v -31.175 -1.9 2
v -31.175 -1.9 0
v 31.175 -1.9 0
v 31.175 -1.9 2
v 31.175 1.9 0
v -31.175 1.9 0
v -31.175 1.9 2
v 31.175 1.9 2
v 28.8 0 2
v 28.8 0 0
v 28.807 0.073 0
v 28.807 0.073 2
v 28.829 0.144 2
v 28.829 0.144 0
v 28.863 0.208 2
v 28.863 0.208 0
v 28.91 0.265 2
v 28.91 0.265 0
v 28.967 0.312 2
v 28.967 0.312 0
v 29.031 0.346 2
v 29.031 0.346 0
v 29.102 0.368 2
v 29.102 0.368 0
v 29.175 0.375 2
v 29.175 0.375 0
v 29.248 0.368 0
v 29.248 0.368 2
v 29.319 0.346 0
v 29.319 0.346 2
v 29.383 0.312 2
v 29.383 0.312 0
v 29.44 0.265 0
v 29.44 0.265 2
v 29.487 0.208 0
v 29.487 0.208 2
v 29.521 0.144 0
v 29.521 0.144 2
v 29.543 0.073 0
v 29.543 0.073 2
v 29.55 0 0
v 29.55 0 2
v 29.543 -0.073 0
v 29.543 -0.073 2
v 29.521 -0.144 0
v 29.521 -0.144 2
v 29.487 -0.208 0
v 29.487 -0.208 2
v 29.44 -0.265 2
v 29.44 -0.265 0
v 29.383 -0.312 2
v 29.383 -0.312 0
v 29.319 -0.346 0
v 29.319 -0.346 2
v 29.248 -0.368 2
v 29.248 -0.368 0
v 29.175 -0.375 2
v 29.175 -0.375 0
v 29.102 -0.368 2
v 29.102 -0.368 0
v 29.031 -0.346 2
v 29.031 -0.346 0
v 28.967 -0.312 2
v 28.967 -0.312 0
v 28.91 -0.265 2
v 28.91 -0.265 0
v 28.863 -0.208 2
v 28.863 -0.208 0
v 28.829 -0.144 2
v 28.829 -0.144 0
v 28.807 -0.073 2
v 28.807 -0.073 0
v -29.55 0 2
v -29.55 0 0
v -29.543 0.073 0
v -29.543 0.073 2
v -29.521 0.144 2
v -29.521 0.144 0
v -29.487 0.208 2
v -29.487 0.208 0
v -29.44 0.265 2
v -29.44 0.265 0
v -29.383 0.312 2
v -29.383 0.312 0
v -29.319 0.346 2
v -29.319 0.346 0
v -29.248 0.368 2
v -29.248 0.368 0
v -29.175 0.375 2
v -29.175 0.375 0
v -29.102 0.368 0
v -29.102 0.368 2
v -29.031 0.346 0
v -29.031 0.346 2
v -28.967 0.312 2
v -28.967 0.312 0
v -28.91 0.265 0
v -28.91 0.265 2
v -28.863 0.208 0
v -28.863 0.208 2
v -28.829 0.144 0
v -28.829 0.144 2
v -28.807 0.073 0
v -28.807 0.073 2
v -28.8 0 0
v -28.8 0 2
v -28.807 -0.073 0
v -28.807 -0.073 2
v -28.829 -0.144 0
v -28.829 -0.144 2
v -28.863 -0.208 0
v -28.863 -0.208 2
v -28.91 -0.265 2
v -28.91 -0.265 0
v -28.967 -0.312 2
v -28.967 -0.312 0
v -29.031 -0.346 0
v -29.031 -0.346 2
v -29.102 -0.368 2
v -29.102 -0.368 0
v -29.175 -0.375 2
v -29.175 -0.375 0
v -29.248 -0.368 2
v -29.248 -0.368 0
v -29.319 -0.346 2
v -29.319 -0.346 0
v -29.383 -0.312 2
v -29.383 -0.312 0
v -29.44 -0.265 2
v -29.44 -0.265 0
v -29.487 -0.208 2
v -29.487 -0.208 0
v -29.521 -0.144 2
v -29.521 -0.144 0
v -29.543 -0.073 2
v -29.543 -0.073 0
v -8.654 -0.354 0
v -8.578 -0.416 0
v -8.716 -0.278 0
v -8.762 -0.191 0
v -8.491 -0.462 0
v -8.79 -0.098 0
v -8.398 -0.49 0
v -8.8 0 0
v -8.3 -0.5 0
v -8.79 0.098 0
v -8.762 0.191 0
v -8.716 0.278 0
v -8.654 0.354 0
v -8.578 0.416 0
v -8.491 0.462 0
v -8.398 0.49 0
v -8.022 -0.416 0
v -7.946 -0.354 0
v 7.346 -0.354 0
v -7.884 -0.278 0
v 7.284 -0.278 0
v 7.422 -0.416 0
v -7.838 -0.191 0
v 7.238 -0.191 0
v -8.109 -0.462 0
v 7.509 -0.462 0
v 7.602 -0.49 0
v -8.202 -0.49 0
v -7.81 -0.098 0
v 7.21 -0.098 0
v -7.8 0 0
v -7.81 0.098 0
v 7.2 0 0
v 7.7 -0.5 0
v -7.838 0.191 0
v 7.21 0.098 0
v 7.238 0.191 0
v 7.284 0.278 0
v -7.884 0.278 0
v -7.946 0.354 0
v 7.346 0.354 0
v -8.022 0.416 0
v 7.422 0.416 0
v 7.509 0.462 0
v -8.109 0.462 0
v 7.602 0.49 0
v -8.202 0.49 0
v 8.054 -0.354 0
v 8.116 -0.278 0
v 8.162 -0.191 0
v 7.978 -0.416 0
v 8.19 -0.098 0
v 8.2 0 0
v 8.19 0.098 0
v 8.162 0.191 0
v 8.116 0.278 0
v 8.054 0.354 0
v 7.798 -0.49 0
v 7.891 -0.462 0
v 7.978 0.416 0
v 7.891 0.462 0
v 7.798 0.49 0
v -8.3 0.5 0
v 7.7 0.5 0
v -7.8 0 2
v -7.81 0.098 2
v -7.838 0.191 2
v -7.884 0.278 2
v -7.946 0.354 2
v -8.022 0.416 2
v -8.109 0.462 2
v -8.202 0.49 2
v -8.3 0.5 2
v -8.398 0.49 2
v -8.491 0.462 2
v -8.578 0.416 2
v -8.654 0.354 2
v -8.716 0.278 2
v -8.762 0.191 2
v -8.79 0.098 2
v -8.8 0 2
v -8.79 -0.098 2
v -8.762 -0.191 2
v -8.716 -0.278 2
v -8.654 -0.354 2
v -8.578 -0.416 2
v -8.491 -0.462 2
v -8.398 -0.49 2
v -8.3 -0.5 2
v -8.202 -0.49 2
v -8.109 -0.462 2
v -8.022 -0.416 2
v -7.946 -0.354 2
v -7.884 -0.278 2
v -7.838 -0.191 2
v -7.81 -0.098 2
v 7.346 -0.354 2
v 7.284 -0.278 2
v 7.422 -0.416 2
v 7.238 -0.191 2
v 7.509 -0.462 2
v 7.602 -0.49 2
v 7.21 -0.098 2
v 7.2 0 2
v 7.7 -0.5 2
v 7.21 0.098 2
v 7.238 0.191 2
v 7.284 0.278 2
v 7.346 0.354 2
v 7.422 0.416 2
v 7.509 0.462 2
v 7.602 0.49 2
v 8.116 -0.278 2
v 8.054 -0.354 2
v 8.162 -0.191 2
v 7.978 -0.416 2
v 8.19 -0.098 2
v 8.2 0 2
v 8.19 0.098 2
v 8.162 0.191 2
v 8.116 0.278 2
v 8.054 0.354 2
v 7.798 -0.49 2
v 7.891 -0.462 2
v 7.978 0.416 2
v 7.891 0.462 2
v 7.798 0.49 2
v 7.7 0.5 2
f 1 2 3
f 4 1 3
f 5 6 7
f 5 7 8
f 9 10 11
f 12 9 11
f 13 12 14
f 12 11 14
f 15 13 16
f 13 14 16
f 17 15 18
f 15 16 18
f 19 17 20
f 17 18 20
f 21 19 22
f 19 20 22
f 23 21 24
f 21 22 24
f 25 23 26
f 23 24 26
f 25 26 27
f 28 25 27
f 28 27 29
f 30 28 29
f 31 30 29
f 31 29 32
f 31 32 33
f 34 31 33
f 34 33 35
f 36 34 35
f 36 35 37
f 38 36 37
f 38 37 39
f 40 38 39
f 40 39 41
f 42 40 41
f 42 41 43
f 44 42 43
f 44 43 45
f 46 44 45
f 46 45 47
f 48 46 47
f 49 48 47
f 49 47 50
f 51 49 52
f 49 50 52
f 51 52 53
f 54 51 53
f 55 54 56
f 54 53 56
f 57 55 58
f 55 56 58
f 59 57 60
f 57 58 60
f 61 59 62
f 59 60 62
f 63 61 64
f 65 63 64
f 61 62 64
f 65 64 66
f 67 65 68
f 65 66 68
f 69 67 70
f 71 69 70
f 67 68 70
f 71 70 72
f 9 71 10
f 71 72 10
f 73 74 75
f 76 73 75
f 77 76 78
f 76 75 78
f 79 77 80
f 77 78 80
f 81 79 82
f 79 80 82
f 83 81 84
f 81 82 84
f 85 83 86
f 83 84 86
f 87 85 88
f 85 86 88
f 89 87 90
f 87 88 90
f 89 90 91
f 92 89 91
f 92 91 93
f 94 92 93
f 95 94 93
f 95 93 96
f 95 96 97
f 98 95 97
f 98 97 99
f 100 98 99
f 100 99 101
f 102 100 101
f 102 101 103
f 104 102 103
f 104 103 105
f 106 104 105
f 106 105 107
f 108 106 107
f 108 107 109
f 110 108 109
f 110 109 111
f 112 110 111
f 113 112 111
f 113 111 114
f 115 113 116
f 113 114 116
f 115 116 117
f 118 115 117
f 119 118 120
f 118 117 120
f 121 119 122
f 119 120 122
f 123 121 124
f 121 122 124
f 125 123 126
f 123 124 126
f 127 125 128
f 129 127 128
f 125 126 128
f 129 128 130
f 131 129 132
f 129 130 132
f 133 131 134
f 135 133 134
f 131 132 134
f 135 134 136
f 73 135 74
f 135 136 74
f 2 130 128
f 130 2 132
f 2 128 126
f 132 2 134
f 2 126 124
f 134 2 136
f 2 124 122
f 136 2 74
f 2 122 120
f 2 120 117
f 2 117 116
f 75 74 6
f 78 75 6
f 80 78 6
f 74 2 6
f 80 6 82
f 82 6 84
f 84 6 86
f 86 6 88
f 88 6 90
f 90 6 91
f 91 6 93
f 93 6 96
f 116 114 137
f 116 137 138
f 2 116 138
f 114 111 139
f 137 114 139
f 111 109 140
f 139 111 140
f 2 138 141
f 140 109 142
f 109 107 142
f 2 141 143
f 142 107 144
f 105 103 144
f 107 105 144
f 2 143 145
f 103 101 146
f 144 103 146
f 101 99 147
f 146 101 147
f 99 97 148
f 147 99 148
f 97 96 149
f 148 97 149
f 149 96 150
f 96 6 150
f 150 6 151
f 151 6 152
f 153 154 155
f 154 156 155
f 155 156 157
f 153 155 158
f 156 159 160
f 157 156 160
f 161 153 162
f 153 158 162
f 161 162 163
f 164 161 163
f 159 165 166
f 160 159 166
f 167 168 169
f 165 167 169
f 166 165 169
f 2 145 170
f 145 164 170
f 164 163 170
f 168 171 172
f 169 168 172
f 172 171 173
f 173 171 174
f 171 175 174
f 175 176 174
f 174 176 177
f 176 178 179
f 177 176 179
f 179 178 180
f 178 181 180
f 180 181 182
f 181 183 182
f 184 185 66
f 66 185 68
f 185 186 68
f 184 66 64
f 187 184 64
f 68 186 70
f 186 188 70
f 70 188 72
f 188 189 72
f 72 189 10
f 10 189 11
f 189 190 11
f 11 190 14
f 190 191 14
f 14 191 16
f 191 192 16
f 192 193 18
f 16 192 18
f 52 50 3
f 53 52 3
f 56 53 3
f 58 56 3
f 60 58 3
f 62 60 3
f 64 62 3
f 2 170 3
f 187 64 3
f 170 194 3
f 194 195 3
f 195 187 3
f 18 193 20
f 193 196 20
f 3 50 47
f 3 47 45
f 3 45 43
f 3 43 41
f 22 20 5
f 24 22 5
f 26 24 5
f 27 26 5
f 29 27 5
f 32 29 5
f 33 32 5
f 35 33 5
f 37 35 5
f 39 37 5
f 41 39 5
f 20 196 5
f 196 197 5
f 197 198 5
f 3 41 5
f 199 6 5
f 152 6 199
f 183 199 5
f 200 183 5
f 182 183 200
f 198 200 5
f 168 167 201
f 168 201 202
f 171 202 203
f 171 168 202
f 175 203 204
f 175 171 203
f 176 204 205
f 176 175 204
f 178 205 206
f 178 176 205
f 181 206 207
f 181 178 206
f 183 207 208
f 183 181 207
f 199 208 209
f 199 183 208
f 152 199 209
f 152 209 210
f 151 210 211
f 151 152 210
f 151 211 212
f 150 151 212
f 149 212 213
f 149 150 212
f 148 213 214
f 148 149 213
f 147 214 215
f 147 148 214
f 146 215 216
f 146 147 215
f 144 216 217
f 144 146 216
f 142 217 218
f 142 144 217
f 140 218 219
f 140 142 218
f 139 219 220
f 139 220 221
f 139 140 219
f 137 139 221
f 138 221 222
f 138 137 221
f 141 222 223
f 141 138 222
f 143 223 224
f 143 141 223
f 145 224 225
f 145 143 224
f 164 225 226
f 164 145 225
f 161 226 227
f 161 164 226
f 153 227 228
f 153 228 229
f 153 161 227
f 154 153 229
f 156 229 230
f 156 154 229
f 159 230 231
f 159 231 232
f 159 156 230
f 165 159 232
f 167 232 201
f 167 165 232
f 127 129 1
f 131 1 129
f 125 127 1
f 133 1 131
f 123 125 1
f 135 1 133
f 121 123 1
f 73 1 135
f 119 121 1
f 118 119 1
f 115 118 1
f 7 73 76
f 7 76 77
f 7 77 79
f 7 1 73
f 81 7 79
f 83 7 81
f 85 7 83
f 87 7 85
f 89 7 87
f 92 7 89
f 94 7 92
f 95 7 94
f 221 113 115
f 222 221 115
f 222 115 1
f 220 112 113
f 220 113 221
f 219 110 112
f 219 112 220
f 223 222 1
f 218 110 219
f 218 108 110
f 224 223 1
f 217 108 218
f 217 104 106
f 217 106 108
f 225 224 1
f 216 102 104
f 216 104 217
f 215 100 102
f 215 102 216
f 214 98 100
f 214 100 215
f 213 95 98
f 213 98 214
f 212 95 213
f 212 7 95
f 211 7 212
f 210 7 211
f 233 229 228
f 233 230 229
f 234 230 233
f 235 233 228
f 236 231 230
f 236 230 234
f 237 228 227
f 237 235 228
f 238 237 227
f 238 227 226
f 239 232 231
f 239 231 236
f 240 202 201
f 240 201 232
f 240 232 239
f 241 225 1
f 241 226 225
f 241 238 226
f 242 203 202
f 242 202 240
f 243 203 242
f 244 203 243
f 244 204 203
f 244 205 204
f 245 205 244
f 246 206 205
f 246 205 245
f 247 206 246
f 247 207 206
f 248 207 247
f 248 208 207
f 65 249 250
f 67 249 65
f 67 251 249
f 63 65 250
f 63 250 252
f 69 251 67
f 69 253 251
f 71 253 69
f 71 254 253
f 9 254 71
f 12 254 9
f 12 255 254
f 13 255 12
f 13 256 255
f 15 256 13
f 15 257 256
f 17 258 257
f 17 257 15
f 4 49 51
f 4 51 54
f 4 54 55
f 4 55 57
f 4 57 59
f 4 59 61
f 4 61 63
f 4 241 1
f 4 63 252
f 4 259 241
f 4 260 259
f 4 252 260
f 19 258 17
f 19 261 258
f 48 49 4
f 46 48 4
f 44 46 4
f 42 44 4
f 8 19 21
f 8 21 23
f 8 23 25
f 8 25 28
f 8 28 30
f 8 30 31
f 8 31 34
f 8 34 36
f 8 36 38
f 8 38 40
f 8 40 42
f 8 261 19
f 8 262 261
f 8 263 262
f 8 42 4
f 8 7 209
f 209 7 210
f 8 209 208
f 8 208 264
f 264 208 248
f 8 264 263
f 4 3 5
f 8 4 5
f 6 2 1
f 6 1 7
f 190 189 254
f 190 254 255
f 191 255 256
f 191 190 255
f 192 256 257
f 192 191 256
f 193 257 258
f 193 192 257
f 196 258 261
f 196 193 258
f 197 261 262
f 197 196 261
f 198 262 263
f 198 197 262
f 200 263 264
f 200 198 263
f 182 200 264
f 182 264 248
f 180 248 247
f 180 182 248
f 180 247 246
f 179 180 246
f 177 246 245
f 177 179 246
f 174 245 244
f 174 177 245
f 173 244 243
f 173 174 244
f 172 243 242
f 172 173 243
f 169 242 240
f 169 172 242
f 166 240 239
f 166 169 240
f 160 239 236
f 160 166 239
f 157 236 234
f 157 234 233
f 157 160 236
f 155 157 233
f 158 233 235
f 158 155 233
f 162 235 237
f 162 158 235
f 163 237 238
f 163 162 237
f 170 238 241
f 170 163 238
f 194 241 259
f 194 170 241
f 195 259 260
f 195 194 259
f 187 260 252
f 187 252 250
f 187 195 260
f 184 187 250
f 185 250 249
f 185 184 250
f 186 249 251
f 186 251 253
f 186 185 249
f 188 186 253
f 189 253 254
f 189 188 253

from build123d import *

# Parameters (mm, degrees)
SKETCH_2_W          = 62.35
SKETCH_2_H          = 3.8
SKETCH_2_R          = 0.5
EXTRUDE_1_DEPTH     = 2
CUT_EXTRUDE_1_REACH = 33.297
SKETCH_3_R          = 0.375


with BuildPart() as part:
    # 草图2 → 凸台-拉伸1 (new body)
    with BuildSketch(Plane.XY):
        Rectangle(SKETCH_2_W, SKETCH_2_H)
        with Locations((7.7, 0)):
            Circle(SKETCH_2_R, mode=Mode.SUBTRACT)
        with Locations((-8.3, 0)):
            Circle(SKETCH_2_R, mode=Mode.SUBTRACT)
    extrude(amount=EXTRUDE_1_DEPTH)

    # 草图3 → 切除-拉伸1 (cut, up to next)
    with BuildSketch(Plane(origin=(0, 0, 0), x_dir=(-1, 0, 0), z_dir=(0, 0, -1)), mode=Mode.PRIVATE) as cut_extrude_1_sk1:
        with Locations((29.175, 0)):
            Circle(SKETCH_3_R)
    cut_extrude_1_tool1 = extrude(cut_extrude_1_sk1.sketch, amount=-CUT_EXTRUDE_1_REACH, mode=Mode.PRIVATE) & part.part
    # 草图3 → 切除-拉伸1 (cut, up to next)
    with BuildSketch(Plane(origin=(0, 0, 0), x_dir=(-1, 0, 0), z_dir=(0, 0, -1)), mode=Mode.PRIVATE) as cut_extrude_1_sk2:
        with Locations((-29.175, 0)):
            Circle(SKETCH_3_R)
    cut_extrude_1_tool2 = extrude(cut_extrude_1_sk2.sketch, amount=-CUT_EXTRUDE_1_REACH, mode=Mode.PRIVATE) & part.part
    add(cut_extrude_1_tool1.solids().sort_by_distance((-29.175, 0, 0))[0], mode=Mode.SUBTRACT)
    add(cut_extrude_1_tool2.solids().sort_by_distance((29.175, 0, 0))[0], mode=Mode.SUBTRACT)


solid = part.part
